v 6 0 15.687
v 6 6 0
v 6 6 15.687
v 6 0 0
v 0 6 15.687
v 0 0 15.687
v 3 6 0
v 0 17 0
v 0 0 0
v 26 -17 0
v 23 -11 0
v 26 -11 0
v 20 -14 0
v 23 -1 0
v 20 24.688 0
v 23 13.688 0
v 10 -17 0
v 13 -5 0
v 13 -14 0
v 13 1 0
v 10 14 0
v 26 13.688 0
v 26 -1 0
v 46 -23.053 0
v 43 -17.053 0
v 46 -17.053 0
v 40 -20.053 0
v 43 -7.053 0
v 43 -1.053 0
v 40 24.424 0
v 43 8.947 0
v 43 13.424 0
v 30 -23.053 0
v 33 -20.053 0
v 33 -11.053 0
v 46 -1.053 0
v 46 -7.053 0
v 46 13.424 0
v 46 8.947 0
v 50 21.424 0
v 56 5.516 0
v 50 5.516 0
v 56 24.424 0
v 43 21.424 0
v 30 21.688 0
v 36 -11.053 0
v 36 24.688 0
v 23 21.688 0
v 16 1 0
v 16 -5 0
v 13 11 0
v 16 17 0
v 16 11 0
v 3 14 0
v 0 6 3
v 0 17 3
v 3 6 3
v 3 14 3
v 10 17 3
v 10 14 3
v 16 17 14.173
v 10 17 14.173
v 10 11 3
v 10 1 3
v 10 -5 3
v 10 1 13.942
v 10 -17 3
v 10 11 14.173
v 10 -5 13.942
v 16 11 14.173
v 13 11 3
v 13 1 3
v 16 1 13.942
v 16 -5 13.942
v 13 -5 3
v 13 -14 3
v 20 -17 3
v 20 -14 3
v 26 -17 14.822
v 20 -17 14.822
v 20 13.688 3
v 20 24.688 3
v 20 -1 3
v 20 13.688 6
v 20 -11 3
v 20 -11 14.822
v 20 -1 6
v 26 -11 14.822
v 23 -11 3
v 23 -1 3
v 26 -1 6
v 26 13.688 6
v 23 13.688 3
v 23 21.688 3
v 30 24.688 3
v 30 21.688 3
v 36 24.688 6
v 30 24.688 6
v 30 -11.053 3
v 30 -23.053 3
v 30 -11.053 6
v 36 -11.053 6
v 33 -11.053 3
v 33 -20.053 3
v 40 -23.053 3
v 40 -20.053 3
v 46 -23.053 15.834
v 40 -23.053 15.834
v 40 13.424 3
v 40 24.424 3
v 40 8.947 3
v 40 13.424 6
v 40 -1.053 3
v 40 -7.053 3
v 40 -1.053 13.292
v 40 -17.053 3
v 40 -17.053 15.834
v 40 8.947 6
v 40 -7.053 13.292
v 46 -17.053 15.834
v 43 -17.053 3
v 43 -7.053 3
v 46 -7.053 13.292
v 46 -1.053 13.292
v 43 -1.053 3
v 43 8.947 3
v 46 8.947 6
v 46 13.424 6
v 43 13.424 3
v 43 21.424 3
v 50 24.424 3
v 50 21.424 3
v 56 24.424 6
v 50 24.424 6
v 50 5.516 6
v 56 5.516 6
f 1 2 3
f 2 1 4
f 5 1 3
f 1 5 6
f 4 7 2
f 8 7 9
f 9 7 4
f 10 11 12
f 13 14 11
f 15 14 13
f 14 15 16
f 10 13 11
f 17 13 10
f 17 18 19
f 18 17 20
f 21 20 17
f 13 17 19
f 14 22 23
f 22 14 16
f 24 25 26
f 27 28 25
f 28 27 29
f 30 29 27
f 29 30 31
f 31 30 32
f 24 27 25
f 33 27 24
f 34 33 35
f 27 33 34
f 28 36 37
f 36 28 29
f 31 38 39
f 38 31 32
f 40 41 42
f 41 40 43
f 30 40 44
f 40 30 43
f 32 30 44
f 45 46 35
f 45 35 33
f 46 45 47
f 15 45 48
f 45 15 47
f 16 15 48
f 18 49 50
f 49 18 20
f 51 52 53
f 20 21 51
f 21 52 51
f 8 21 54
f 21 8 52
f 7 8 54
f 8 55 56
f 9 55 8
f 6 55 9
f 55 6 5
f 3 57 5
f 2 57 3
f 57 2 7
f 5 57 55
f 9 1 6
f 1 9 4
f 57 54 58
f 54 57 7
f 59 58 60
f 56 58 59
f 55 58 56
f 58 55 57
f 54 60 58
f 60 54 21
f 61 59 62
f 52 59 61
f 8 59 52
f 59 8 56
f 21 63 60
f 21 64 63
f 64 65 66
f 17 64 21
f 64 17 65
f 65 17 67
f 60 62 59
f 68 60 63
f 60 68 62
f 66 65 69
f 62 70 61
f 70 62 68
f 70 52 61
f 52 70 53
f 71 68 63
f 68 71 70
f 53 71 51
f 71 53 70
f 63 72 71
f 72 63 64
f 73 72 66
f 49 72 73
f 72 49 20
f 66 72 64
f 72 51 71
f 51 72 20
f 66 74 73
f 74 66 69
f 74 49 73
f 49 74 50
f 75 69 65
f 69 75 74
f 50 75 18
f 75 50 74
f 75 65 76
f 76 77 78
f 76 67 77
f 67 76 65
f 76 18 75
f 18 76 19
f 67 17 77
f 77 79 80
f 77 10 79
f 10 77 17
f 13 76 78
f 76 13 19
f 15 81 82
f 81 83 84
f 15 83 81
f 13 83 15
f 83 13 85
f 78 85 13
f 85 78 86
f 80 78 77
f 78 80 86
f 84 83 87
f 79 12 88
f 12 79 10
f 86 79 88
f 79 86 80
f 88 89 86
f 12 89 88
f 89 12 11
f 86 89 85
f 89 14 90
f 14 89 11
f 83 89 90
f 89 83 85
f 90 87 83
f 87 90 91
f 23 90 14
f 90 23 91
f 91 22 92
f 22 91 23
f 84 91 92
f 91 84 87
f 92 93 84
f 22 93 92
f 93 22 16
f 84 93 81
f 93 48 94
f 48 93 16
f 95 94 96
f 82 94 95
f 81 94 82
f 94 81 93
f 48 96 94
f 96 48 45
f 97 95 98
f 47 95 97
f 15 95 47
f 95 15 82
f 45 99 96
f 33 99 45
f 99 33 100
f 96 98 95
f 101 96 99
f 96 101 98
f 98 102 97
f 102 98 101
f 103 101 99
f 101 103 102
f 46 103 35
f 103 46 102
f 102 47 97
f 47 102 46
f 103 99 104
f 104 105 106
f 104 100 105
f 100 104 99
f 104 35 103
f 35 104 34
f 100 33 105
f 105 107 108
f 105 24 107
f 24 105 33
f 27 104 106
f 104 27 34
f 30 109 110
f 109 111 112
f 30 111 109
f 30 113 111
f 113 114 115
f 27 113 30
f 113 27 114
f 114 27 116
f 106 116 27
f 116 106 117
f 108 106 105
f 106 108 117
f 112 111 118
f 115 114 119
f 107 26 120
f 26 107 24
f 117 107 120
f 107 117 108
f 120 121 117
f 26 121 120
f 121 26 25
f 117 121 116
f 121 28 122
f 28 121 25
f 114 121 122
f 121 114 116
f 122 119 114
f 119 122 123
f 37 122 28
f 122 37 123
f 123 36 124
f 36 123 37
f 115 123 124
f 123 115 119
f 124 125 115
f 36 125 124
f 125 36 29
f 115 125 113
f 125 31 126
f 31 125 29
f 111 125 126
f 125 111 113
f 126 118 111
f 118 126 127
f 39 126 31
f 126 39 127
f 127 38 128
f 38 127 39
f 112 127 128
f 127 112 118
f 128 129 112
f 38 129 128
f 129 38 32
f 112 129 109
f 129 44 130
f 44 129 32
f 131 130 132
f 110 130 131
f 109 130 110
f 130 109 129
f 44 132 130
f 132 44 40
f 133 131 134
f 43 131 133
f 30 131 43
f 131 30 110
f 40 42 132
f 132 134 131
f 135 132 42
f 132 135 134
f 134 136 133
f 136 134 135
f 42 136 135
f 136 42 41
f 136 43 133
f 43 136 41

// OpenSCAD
translate([0.000000, 0.000000, 0]) rotate([0,0.000000,0]) cube([6.000000, 6.000000, 15.687444]);translate([0.000000, 6.000000, 0]) rotate([0,0,0]) cube([3.000000, 10.000000, 3.000000]);translate([0.000000, 17.000000, 0]) rotate([0,0,-90]) cube([3.000000, 10.000000, 3.000000]);translate([16.000000, 17.000000, 0.000000]) rotate([180, 180.000000 ,0]) cube([6.000000, 6.000000, 14.173081]);translate([0.000000, 6.000000, 0]) rotate([0,0,0]) cube([3.000000, 10.000000, 3.000000]);translate([10.000000, 11.000000, 3.000000]) rotate([180, 0, 0]) cube([3.000000, 10.000000, 3.000000]);translate([16.000000, 1.000000, 0.000000]) rotate([180, 180.000000 ,0]) cube([6.000000, 6.000000, 13.942338]);translate([0.000000, 6.000000, 0]) rotate([0,0,0]) cube([3.000000, 10.000000, 3.000000]);translate([10.000000, 11.000000, 3.000000]) rotate([180, 0, 0]) cube([3.000000, 10.000000, 3.000000]);translate([10.000000, -5.000000, 3.000000]) rotate([180, 0, 0]) cube([3.000000, 10.000000, 3.000000]);translate([10.000000, -14.000000, 0]) rotate([0,0,-90]) cube([3.000000, 10.000000, 3.000000]);translate([20.000000, -17.000000, 0]) rotate([0,0.000000,0]) cube([6.000000, 6.000000, 14.821565]);translate([20.000000, -11.000000, 0]) rotate([0,0,0]) cube([3.000000, 10.000000, 3.000000]);translate([20.000000, -1.000000, 0]) rotate([0,0.000000,0]) cube([6.000000, 14.688103, 6.000000]);translate([20.000000, 13.688103, 0]) rotate([0,0,0]) cube([3.000000, 10.000000, 3.000000]);translate([20.000000, 24.688103, 0]) rotate([0,0,-90]) cube([3.000000, 10.000000, 3.000000]);translate([30.000000, 24.688103, 6.000000]) rotate([180, 0.000000 ,0]) cube([6.000000, 35.741387, 6.000000]);translate([20.000000, 13.688103, 0]) rotate([0,0,0]) cube([3.000000, 10.000000, 3.000000]);translate([30.000000, -11.053284, 3.000000]) rotate([180, 0, 0]) cube([3.000000, 10.000000, 3.000000]);translate([30.000000, -20.053284, 0]) rotate([0,0,-90]) cube([3.000000, 10.000000, 3.000000]);translate([40.000000, -23.053284, 0]) rotate([0,0.000000,0]) cube([6.000000, 6.000000, 15.833687]);translate([40.000000, -17.053284, 0]) rotate([0,0,0]) cube([3.000000, 10.000000, 3.000000]);translate([40.000000, -7.053284, 0]) rotate([0,0.000000,0]) cube([6.000000, 6.000000, 13.291805]);translate([40.000000, -1.053284, 0]) rotate([0,0,0]) cube([3.000000, 10.000000, 3.000000]);translate([40.000000, 8.946716, 0]) rotate([0,0.000000,0]) cube([6.000000, 4.477220, 6.000000]);translate([40.000000, 13.423936, 0]) rotate([0,0,0]) cube([3.000000, 10.000000, 3.000000]);translate([40.000000, 24.423936, 0]) rotate([0,0,-90]) cube([3.000000, 10.000000, 3.000000]);translate([50.000000, 24.423936, 6.000000]) rotate([180, 0.000000 ,0]) cube([6.000000, 18.907636, 6.000000]);
